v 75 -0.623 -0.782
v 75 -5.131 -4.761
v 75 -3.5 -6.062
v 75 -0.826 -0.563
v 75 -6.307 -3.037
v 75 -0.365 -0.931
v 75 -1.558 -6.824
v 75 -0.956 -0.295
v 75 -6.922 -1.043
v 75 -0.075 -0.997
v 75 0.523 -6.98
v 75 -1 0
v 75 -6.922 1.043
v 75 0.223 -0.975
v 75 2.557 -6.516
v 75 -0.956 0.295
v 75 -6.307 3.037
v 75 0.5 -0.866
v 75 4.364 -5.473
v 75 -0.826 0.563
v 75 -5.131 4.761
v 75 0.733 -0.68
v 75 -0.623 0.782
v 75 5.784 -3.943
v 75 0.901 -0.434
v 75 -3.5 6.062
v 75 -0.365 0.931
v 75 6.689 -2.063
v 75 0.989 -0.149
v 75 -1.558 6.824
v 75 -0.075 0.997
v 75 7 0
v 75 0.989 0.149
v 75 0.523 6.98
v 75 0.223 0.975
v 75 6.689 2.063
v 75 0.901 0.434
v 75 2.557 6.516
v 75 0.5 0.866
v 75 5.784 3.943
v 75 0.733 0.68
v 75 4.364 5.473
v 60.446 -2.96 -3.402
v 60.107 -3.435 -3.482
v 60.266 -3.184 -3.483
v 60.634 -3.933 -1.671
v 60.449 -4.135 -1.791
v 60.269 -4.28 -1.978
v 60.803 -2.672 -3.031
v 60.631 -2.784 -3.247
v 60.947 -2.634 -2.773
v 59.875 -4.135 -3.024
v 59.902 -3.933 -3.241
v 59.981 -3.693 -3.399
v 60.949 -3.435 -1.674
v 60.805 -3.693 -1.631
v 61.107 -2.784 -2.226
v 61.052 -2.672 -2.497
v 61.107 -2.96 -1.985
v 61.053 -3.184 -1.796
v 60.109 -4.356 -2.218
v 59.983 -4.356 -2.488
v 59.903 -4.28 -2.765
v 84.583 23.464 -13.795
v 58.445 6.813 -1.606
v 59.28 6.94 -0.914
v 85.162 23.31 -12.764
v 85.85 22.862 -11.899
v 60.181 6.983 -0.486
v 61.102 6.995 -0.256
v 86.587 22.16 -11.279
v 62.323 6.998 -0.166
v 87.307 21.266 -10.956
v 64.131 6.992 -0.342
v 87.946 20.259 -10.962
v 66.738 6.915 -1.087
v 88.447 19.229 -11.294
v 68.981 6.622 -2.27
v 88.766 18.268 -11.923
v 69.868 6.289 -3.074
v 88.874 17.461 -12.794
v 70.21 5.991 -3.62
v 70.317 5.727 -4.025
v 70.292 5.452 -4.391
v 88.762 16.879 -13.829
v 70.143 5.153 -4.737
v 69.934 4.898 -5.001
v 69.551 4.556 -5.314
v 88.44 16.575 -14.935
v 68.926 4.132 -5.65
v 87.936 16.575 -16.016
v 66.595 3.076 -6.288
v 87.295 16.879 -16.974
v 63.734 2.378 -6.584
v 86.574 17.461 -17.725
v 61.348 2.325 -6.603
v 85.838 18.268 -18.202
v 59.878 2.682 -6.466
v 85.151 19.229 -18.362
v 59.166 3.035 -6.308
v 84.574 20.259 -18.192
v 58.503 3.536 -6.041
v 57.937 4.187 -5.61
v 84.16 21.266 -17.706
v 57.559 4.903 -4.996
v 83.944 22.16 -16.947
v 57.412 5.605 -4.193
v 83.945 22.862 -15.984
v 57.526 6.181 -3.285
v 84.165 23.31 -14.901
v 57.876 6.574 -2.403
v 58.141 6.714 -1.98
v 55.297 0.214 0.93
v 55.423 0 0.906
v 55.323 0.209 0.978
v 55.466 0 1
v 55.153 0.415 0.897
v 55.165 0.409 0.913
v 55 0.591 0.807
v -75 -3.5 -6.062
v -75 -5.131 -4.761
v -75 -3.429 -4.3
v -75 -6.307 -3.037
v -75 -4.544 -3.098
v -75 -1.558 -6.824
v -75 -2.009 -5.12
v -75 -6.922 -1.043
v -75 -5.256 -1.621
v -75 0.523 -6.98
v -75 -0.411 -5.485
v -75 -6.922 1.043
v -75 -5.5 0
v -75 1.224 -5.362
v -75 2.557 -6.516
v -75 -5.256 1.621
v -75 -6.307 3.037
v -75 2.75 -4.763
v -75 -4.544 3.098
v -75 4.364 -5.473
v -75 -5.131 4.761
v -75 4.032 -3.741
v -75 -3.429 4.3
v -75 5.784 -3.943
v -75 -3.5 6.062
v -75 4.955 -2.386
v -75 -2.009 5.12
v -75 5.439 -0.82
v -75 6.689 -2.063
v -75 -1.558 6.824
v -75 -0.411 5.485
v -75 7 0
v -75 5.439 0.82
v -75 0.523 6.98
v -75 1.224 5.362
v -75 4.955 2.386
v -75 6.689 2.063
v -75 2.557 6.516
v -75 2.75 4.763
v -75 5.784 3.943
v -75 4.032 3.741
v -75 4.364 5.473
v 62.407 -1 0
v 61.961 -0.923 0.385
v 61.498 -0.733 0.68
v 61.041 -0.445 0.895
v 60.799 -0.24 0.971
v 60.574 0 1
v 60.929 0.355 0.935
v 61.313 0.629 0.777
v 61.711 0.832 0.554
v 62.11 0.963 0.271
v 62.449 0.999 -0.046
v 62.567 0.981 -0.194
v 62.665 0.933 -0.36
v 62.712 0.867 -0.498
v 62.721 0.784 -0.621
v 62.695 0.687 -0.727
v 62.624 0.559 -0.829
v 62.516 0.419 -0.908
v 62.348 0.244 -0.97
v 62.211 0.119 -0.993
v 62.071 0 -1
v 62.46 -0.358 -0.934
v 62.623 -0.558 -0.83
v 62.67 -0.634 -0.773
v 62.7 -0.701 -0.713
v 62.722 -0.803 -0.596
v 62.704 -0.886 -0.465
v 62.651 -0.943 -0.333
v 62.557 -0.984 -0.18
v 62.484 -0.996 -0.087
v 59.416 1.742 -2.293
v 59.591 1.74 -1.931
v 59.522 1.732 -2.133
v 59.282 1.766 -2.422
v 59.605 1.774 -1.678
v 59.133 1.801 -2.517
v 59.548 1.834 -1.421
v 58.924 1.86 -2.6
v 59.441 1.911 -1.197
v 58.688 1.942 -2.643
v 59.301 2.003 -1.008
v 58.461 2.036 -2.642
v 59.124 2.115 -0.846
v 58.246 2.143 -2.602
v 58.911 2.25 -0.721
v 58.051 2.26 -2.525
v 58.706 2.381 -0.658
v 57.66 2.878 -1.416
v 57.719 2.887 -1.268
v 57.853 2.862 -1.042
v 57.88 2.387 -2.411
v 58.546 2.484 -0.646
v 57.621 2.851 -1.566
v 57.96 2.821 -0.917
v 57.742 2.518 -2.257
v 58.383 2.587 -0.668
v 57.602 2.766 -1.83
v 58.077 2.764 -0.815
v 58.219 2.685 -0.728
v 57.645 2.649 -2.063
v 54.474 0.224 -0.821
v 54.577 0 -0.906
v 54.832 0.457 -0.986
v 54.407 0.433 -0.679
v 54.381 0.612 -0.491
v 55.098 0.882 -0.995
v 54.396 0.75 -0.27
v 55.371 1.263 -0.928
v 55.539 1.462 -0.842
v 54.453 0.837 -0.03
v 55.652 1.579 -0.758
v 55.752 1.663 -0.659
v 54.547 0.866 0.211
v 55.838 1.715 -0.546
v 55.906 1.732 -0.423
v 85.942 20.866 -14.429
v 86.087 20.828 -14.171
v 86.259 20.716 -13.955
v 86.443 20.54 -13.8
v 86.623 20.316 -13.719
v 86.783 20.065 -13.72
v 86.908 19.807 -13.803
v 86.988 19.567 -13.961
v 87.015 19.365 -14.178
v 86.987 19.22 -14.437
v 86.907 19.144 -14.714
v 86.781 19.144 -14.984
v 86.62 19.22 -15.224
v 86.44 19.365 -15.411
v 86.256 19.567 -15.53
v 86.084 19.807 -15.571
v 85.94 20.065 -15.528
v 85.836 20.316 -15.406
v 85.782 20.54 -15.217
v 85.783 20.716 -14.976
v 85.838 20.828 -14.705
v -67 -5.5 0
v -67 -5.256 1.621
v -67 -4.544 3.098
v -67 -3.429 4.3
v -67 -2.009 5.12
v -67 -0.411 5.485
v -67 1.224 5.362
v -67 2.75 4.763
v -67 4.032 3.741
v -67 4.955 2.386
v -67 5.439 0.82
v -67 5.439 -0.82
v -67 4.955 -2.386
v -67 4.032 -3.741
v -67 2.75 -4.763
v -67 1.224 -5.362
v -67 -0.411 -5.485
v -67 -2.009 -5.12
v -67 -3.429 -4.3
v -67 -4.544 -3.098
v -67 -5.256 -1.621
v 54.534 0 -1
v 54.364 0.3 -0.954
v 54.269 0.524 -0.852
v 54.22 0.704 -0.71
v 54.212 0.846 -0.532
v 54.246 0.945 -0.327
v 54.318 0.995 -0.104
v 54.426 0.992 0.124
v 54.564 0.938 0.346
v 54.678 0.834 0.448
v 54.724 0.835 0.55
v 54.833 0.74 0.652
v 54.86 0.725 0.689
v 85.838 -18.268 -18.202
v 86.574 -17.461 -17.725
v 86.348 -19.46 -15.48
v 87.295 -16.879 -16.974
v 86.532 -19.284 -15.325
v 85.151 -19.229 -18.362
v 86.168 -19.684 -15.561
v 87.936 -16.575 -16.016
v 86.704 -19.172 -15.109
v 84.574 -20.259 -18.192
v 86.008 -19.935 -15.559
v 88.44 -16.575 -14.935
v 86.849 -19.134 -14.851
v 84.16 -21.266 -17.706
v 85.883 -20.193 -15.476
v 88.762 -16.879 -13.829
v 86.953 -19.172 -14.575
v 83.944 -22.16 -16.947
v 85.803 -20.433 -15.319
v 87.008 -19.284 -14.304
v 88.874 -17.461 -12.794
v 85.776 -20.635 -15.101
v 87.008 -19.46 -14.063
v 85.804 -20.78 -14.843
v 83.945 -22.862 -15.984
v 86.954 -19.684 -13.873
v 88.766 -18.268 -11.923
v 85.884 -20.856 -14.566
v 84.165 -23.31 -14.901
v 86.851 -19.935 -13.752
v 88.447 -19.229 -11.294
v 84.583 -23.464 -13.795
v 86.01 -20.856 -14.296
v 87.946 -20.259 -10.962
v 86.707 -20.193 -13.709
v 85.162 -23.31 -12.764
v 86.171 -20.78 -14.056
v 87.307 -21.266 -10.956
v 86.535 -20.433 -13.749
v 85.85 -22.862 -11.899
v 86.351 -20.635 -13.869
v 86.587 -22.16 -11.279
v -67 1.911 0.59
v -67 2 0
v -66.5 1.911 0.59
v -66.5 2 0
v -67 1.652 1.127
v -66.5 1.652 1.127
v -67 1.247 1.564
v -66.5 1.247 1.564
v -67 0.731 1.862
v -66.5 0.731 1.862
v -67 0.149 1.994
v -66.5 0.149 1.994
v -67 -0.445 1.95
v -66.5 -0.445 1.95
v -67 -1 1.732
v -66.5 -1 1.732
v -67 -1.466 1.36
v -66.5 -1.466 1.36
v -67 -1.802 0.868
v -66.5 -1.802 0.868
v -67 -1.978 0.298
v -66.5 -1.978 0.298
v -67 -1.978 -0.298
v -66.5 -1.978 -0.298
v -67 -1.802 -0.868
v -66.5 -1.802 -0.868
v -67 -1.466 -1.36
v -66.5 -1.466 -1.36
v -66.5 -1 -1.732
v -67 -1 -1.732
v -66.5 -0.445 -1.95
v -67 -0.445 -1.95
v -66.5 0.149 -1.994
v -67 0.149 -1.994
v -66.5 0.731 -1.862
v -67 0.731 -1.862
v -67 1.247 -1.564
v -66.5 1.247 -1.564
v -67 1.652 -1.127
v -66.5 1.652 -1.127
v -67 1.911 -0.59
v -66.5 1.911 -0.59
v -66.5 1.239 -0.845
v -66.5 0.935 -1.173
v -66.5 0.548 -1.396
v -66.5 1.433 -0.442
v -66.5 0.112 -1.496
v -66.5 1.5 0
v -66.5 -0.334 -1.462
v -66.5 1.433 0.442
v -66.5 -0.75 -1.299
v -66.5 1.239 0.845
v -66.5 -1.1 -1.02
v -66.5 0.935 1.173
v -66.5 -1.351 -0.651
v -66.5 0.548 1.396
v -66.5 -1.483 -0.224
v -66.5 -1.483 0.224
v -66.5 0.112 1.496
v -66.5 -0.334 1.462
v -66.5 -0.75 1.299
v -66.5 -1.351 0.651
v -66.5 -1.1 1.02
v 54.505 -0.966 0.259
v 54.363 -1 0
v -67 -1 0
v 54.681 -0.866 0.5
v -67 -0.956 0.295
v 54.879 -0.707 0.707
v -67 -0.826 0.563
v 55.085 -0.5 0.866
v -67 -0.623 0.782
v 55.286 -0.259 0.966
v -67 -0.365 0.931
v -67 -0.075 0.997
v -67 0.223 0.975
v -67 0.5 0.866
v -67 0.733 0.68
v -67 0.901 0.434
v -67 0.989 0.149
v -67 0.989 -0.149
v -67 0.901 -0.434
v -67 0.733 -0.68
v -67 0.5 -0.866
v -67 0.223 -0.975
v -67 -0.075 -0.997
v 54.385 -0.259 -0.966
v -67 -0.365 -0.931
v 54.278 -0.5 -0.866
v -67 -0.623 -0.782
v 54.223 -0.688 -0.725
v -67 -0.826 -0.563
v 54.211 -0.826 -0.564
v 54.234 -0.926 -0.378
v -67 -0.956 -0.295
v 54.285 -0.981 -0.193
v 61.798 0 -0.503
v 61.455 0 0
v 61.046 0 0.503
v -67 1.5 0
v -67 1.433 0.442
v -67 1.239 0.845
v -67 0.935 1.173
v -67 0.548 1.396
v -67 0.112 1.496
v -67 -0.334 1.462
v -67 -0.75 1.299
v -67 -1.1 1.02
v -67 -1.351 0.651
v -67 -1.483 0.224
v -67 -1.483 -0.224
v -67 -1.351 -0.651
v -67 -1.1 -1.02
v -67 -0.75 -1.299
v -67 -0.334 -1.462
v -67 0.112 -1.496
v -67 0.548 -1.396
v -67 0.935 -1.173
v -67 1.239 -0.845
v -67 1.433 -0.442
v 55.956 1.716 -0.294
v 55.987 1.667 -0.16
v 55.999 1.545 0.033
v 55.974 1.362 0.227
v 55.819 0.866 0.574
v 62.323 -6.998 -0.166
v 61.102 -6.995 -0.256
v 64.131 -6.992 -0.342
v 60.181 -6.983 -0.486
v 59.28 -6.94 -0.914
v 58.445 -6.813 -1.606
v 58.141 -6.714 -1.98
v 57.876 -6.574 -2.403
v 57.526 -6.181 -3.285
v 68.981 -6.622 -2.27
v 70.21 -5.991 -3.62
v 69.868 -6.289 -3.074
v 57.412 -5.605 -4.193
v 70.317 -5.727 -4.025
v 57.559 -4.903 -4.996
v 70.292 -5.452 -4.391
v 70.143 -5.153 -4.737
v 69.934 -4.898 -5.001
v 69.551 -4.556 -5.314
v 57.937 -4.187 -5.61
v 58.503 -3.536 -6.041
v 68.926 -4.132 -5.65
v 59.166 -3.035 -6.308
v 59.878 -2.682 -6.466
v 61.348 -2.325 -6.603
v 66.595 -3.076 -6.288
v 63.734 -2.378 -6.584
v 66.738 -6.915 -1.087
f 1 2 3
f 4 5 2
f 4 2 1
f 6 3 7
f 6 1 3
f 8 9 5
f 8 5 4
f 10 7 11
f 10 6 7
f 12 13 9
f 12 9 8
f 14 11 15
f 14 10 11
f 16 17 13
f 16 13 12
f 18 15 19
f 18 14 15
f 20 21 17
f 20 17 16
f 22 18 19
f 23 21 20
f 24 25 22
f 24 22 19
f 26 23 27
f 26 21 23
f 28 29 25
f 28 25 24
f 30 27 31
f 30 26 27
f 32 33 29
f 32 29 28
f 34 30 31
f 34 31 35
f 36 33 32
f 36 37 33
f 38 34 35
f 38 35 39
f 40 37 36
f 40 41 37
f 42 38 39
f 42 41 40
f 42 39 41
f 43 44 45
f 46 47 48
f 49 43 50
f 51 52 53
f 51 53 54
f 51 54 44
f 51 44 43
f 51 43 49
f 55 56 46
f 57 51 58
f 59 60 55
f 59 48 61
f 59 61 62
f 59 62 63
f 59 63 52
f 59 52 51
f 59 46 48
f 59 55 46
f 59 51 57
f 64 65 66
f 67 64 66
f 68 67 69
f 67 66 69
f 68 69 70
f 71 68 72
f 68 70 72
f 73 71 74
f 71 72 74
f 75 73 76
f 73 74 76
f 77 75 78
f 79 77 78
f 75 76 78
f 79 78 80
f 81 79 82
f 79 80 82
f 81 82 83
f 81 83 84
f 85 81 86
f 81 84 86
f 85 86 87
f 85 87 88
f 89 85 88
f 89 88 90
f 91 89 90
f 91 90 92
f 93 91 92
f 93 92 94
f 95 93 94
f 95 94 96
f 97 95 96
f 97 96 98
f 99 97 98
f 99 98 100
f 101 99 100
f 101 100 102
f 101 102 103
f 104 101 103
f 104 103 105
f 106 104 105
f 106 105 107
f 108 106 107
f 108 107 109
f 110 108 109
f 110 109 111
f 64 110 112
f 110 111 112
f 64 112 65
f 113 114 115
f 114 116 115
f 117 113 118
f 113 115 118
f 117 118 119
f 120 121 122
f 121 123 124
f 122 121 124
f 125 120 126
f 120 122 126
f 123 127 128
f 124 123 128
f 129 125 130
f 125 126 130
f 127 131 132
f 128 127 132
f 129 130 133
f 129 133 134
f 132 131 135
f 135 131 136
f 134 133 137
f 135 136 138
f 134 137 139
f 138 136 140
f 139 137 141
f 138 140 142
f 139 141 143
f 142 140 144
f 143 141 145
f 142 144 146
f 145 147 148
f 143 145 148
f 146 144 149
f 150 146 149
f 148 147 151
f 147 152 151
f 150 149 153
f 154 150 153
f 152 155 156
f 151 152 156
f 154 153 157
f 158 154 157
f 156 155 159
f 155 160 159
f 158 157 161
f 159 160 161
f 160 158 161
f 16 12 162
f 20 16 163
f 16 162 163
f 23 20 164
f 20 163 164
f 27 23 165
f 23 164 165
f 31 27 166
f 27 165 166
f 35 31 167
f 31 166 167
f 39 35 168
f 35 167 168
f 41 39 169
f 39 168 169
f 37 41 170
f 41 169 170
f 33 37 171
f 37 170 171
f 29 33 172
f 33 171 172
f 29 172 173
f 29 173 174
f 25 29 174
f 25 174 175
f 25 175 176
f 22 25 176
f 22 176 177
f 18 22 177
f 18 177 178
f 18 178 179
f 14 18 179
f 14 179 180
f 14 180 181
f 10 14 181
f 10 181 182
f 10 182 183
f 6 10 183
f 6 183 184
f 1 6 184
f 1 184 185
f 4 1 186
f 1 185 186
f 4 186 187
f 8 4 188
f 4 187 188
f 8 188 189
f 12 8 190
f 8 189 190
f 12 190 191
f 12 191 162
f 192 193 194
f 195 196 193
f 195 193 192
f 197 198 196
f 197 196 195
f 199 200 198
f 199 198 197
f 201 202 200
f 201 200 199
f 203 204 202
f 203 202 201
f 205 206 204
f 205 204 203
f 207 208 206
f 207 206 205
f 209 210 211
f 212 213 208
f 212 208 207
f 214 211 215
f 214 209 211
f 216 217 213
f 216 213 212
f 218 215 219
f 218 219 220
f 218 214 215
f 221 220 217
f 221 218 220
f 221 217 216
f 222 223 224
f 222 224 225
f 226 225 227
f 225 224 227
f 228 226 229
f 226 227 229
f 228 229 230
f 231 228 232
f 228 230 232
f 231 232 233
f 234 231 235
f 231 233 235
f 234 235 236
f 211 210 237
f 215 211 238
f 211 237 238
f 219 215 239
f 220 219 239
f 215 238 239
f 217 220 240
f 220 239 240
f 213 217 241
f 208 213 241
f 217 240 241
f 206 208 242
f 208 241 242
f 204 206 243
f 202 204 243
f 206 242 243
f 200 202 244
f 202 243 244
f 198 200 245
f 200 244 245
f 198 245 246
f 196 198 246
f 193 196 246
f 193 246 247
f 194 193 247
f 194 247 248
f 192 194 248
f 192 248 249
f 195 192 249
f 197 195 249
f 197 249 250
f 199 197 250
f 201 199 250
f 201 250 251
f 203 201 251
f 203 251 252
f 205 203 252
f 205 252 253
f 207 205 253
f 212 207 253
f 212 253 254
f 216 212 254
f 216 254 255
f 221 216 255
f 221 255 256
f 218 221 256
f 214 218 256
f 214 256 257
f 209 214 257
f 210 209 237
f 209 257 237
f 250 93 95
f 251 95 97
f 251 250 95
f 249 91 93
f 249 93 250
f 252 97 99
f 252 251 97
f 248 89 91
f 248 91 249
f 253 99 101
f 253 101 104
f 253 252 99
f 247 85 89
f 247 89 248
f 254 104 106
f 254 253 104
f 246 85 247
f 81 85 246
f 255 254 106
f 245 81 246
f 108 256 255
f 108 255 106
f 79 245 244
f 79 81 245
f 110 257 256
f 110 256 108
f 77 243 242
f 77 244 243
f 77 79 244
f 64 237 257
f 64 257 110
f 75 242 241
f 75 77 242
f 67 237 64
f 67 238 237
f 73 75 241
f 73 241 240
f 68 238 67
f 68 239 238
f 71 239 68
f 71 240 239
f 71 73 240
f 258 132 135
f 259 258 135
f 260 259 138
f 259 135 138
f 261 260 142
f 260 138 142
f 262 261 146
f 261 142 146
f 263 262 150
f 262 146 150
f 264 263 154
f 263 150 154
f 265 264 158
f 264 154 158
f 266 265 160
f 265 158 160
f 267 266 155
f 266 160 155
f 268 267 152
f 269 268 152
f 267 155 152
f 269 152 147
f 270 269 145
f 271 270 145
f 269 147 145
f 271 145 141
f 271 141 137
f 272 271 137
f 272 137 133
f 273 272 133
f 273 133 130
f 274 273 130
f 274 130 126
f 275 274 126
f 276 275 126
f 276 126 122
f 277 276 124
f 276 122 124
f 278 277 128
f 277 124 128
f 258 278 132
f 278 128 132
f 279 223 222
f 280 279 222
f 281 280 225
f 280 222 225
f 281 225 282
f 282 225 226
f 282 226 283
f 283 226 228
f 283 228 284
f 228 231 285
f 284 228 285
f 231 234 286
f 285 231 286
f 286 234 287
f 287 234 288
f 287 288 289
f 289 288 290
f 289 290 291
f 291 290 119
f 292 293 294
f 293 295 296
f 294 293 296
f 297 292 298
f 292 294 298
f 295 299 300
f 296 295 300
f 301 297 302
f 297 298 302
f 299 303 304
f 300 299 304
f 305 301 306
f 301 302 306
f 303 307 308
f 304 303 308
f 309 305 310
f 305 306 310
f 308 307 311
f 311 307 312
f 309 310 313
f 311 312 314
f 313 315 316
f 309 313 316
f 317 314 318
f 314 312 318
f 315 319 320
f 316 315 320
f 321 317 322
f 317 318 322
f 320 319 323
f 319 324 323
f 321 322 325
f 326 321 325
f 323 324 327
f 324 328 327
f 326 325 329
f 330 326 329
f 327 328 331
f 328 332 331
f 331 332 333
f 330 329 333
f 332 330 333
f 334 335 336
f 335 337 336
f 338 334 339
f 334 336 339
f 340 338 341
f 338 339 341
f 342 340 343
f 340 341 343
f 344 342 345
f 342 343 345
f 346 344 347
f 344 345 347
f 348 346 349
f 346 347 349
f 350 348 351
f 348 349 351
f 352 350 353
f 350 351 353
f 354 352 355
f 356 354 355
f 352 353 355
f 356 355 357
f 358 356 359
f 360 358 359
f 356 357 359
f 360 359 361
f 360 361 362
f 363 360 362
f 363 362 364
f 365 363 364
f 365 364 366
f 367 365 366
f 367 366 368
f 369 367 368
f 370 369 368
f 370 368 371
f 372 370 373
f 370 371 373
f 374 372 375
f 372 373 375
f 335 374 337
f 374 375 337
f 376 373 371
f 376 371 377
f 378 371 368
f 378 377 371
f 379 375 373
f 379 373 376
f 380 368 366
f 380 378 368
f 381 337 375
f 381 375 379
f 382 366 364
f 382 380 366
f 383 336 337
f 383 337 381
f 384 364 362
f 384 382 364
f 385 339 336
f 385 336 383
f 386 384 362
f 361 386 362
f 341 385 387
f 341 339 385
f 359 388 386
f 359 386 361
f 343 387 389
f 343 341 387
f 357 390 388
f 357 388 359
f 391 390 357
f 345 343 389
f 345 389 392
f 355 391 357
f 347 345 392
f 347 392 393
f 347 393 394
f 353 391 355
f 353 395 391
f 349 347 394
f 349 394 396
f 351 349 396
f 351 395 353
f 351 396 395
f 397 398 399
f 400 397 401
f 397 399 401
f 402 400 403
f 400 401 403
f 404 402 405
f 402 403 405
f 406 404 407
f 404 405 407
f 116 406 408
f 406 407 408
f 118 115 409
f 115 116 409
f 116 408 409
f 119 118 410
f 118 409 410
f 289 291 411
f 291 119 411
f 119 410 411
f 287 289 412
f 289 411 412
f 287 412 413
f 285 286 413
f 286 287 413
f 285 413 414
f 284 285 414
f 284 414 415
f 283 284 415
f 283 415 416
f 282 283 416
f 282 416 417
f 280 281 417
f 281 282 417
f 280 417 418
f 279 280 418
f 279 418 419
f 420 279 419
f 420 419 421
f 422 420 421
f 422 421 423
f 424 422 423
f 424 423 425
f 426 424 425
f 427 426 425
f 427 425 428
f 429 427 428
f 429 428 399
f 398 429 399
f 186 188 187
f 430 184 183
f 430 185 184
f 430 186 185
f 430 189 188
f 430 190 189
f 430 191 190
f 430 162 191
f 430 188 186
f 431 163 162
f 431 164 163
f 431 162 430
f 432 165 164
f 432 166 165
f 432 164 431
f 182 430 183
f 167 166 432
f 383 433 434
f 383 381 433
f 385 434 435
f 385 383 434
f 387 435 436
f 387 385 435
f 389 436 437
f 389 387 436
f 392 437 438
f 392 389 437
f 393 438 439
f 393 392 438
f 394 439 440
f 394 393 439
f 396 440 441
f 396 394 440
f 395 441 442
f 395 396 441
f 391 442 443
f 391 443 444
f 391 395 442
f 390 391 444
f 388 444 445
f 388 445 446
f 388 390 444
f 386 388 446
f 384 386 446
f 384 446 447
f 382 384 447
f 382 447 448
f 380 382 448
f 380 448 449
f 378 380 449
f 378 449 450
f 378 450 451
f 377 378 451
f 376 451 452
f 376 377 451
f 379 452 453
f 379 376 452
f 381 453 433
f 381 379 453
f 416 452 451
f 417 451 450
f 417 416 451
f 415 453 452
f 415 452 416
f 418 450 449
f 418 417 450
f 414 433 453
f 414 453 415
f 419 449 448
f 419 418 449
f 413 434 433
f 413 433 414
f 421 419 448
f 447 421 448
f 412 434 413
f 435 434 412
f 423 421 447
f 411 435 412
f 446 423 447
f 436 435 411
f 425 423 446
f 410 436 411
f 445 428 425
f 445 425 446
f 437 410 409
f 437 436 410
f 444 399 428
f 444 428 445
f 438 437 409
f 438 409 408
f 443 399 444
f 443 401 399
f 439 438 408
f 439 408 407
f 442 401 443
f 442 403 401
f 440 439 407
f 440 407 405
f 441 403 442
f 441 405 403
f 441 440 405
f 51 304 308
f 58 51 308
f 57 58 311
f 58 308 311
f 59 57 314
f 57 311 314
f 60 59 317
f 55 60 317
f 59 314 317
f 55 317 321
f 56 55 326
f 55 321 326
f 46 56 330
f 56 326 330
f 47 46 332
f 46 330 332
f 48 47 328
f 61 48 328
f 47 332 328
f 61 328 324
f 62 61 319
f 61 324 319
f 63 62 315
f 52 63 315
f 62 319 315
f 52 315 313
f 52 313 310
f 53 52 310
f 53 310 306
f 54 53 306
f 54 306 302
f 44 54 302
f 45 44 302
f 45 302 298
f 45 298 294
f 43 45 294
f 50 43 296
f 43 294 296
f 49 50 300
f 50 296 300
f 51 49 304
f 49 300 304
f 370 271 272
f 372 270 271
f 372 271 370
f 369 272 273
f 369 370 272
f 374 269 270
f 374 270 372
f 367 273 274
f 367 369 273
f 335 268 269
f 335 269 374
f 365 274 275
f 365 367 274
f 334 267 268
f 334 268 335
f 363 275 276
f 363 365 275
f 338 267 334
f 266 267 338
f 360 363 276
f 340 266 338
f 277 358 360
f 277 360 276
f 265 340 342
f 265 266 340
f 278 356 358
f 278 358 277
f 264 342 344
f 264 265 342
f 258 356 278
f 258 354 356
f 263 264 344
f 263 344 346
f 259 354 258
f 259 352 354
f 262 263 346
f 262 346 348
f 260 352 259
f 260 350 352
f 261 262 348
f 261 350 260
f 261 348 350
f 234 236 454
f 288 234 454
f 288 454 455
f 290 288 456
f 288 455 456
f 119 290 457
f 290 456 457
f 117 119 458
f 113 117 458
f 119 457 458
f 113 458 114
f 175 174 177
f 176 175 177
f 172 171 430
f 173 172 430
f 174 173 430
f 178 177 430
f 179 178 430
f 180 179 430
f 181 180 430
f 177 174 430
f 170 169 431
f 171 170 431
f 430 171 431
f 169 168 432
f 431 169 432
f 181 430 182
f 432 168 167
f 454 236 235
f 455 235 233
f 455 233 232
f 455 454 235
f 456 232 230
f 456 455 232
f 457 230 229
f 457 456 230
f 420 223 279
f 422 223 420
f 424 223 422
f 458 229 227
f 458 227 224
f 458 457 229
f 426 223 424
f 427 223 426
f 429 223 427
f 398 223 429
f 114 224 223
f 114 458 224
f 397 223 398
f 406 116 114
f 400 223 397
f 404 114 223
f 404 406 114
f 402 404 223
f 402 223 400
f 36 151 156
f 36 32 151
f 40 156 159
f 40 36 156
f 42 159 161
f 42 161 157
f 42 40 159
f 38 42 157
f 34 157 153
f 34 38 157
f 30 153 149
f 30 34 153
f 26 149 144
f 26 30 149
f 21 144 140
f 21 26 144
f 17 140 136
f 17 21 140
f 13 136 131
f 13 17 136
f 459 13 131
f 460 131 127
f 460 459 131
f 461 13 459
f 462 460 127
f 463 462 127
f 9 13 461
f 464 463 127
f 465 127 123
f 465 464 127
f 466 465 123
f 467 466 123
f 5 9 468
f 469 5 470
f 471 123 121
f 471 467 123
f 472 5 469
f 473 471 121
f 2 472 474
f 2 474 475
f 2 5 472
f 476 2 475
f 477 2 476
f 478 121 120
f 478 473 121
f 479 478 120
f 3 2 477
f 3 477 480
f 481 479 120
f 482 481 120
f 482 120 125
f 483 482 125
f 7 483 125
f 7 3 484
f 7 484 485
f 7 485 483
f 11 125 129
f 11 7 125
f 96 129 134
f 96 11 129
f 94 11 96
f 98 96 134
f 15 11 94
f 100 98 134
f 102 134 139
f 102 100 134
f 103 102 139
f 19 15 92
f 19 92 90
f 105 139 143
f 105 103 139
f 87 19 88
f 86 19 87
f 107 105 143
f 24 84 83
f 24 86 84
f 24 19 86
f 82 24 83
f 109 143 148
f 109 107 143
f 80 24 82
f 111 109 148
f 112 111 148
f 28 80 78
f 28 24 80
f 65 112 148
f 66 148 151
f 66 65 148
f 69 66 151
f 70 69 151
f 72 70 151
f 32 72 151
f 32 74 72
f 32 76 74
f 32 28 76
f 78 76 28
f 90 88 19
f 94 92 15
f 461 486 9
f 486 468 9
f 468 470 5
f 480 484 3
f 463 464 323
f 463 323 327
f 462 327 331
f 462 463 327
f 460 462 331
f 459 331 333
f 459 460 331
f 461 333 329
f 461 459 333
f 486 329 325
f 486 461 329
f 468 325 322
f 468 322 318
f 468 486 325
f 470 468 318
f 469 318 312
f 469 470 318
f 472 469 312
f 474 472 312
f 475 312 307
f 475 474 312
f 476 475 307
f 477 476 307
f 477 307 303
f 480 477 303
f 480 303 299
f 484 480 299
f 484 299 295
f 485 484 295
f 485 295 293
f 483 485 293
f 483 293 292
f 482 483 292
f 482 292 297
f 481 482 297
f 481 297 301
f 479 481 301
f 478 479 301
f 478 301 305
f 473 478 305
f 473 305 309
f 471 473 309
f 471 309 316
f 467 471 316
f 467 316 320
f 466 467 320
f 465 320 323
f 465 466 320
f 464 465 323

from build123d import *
from build123d import SkipClean  # not in build123d's __all__

# Parameters (mm, degrees)
F0_R      = 7
F1_DEPTH  = 75
F2_R      = 1
F3_DEPTH  = 150.001
F4_R      = 5.5
F4_R_2    = 1
F5_DEPTH  = 8
F6_W      = 0.5
F6_H      = 0.5
F13_R     = 4
F14_DEPTH = 40
F16_R     = 1
F17_DEPTH = 40
F18_R     = 4
F19_DEPTH = 40
F20_R     = 1
F21_DEPTH = 33


with BuildPart() as f1:
    # F0 (on Right) → F1 (new body, symmetric)
    with BuildSketch(Plane.YZ):
        Circle(F0_R)
    extrude(amount=F1_DEPTH, both=True)

    # F2 (on face) → F3 (cut, through all)
    with BuildSketch(Plane(origin=(-75, 0, 0), x_dir=(0, -1, 0), z_dir=(-1, 0, 0))):
        Circle(F2_R)
    extrude(amount=-F3_DEPTH, mode=Mode.SUBTRACT)

    # F4 (on face) → F5 (cut)
    with BuildSketch(Plane(origin=(-75, 0, 0), x_dir=(0, -1, 0), z_dir=(-1, 0, 0))):
        Circle(F4_R)
        Circle(F4_R_2, mode=Mode.SUBTRACT)
    extrude(amount=-F5_DEPTH, mode=Mode.SUBTRACT)

    # F6 (on Top) → F7 (revolve, cut)
    with BuildSketch(Plane.XY):
        with Locations((-66.75, 1.75)):
            Rectangle(F6_W, F6_H)
    revolve(axis=Axis((-60.2624397725, 0, 0), (1, 0, 0)), mode=Mode.SUBTRACT)

    # F13 (on face) → F14 (join)
    with BuildSketch(Plane(origin=(33.8824944498, 21.5843530986, -15.7996666393), x_dir=(-0.4531538935, 0.8660254038, 0.2113091309), z_dir=(0.7848855672, 0.5, -0.3659981508))):
        with Locations((-24.9234641435, 23.2440043957)):
            Circle(F13_R)
    extrude(amount=F14_DEPTH)

    # F16 (on face) → F17 (cut)
    with BuildSketch(Plane(origin=(65.2779171386, 41.5843530986, -30.4395926702), x_dir=(-0.4531538935, 0.8660254038, 0.2113091309), z_dir=(0.7848855672, 0.5, -0.3659981508))):
        with Locations((-24.9234641435, 23.2440043957)):
            Circle(F16_R)
    extrude(amount=-F17_DEPTH, mode=Mode.SUBTRACT)

    # F18 (on face) → F19 (join)
    with BuildSketch(Plane(origin=(33.8824944498, -21.5843530986, -15.7996666393), x_dir=(-0.4531538935, -0.8660254038, 0.2113091309), z_dir=(-0.7848855672, 0.5, 0.3659981508))):
        with Locations((-24.9234641435, 23.2440043957)):
            Circle(F18_R)
    with SkipClean():  # cleaning this boolean's faces spoils the solid; the shape is the same uncleaned
        extrude(amount=-F19_DEPTH)

    # F20 (on face) → F21 (cut)
    with BuildSketch(Plane(origin=(65.2779171386, -41.5843530986, -30.4395926702), x_dir=(0.4531538935, 0.8660254038, -0.2113091309), z_dir=(0.7848855672, -0.5, -0.3659981508))):
        with Locations((24.9234641435, 23.2440043957)):
            Circle(F20_R)
    with SkipClean():  # cleaning this boolean's faces spoils the solid; the shape is the same uncleaned
        extrude(amount=-F21_DEPTH, mode=Mode.SUBTRACT)


solid = f1.part
